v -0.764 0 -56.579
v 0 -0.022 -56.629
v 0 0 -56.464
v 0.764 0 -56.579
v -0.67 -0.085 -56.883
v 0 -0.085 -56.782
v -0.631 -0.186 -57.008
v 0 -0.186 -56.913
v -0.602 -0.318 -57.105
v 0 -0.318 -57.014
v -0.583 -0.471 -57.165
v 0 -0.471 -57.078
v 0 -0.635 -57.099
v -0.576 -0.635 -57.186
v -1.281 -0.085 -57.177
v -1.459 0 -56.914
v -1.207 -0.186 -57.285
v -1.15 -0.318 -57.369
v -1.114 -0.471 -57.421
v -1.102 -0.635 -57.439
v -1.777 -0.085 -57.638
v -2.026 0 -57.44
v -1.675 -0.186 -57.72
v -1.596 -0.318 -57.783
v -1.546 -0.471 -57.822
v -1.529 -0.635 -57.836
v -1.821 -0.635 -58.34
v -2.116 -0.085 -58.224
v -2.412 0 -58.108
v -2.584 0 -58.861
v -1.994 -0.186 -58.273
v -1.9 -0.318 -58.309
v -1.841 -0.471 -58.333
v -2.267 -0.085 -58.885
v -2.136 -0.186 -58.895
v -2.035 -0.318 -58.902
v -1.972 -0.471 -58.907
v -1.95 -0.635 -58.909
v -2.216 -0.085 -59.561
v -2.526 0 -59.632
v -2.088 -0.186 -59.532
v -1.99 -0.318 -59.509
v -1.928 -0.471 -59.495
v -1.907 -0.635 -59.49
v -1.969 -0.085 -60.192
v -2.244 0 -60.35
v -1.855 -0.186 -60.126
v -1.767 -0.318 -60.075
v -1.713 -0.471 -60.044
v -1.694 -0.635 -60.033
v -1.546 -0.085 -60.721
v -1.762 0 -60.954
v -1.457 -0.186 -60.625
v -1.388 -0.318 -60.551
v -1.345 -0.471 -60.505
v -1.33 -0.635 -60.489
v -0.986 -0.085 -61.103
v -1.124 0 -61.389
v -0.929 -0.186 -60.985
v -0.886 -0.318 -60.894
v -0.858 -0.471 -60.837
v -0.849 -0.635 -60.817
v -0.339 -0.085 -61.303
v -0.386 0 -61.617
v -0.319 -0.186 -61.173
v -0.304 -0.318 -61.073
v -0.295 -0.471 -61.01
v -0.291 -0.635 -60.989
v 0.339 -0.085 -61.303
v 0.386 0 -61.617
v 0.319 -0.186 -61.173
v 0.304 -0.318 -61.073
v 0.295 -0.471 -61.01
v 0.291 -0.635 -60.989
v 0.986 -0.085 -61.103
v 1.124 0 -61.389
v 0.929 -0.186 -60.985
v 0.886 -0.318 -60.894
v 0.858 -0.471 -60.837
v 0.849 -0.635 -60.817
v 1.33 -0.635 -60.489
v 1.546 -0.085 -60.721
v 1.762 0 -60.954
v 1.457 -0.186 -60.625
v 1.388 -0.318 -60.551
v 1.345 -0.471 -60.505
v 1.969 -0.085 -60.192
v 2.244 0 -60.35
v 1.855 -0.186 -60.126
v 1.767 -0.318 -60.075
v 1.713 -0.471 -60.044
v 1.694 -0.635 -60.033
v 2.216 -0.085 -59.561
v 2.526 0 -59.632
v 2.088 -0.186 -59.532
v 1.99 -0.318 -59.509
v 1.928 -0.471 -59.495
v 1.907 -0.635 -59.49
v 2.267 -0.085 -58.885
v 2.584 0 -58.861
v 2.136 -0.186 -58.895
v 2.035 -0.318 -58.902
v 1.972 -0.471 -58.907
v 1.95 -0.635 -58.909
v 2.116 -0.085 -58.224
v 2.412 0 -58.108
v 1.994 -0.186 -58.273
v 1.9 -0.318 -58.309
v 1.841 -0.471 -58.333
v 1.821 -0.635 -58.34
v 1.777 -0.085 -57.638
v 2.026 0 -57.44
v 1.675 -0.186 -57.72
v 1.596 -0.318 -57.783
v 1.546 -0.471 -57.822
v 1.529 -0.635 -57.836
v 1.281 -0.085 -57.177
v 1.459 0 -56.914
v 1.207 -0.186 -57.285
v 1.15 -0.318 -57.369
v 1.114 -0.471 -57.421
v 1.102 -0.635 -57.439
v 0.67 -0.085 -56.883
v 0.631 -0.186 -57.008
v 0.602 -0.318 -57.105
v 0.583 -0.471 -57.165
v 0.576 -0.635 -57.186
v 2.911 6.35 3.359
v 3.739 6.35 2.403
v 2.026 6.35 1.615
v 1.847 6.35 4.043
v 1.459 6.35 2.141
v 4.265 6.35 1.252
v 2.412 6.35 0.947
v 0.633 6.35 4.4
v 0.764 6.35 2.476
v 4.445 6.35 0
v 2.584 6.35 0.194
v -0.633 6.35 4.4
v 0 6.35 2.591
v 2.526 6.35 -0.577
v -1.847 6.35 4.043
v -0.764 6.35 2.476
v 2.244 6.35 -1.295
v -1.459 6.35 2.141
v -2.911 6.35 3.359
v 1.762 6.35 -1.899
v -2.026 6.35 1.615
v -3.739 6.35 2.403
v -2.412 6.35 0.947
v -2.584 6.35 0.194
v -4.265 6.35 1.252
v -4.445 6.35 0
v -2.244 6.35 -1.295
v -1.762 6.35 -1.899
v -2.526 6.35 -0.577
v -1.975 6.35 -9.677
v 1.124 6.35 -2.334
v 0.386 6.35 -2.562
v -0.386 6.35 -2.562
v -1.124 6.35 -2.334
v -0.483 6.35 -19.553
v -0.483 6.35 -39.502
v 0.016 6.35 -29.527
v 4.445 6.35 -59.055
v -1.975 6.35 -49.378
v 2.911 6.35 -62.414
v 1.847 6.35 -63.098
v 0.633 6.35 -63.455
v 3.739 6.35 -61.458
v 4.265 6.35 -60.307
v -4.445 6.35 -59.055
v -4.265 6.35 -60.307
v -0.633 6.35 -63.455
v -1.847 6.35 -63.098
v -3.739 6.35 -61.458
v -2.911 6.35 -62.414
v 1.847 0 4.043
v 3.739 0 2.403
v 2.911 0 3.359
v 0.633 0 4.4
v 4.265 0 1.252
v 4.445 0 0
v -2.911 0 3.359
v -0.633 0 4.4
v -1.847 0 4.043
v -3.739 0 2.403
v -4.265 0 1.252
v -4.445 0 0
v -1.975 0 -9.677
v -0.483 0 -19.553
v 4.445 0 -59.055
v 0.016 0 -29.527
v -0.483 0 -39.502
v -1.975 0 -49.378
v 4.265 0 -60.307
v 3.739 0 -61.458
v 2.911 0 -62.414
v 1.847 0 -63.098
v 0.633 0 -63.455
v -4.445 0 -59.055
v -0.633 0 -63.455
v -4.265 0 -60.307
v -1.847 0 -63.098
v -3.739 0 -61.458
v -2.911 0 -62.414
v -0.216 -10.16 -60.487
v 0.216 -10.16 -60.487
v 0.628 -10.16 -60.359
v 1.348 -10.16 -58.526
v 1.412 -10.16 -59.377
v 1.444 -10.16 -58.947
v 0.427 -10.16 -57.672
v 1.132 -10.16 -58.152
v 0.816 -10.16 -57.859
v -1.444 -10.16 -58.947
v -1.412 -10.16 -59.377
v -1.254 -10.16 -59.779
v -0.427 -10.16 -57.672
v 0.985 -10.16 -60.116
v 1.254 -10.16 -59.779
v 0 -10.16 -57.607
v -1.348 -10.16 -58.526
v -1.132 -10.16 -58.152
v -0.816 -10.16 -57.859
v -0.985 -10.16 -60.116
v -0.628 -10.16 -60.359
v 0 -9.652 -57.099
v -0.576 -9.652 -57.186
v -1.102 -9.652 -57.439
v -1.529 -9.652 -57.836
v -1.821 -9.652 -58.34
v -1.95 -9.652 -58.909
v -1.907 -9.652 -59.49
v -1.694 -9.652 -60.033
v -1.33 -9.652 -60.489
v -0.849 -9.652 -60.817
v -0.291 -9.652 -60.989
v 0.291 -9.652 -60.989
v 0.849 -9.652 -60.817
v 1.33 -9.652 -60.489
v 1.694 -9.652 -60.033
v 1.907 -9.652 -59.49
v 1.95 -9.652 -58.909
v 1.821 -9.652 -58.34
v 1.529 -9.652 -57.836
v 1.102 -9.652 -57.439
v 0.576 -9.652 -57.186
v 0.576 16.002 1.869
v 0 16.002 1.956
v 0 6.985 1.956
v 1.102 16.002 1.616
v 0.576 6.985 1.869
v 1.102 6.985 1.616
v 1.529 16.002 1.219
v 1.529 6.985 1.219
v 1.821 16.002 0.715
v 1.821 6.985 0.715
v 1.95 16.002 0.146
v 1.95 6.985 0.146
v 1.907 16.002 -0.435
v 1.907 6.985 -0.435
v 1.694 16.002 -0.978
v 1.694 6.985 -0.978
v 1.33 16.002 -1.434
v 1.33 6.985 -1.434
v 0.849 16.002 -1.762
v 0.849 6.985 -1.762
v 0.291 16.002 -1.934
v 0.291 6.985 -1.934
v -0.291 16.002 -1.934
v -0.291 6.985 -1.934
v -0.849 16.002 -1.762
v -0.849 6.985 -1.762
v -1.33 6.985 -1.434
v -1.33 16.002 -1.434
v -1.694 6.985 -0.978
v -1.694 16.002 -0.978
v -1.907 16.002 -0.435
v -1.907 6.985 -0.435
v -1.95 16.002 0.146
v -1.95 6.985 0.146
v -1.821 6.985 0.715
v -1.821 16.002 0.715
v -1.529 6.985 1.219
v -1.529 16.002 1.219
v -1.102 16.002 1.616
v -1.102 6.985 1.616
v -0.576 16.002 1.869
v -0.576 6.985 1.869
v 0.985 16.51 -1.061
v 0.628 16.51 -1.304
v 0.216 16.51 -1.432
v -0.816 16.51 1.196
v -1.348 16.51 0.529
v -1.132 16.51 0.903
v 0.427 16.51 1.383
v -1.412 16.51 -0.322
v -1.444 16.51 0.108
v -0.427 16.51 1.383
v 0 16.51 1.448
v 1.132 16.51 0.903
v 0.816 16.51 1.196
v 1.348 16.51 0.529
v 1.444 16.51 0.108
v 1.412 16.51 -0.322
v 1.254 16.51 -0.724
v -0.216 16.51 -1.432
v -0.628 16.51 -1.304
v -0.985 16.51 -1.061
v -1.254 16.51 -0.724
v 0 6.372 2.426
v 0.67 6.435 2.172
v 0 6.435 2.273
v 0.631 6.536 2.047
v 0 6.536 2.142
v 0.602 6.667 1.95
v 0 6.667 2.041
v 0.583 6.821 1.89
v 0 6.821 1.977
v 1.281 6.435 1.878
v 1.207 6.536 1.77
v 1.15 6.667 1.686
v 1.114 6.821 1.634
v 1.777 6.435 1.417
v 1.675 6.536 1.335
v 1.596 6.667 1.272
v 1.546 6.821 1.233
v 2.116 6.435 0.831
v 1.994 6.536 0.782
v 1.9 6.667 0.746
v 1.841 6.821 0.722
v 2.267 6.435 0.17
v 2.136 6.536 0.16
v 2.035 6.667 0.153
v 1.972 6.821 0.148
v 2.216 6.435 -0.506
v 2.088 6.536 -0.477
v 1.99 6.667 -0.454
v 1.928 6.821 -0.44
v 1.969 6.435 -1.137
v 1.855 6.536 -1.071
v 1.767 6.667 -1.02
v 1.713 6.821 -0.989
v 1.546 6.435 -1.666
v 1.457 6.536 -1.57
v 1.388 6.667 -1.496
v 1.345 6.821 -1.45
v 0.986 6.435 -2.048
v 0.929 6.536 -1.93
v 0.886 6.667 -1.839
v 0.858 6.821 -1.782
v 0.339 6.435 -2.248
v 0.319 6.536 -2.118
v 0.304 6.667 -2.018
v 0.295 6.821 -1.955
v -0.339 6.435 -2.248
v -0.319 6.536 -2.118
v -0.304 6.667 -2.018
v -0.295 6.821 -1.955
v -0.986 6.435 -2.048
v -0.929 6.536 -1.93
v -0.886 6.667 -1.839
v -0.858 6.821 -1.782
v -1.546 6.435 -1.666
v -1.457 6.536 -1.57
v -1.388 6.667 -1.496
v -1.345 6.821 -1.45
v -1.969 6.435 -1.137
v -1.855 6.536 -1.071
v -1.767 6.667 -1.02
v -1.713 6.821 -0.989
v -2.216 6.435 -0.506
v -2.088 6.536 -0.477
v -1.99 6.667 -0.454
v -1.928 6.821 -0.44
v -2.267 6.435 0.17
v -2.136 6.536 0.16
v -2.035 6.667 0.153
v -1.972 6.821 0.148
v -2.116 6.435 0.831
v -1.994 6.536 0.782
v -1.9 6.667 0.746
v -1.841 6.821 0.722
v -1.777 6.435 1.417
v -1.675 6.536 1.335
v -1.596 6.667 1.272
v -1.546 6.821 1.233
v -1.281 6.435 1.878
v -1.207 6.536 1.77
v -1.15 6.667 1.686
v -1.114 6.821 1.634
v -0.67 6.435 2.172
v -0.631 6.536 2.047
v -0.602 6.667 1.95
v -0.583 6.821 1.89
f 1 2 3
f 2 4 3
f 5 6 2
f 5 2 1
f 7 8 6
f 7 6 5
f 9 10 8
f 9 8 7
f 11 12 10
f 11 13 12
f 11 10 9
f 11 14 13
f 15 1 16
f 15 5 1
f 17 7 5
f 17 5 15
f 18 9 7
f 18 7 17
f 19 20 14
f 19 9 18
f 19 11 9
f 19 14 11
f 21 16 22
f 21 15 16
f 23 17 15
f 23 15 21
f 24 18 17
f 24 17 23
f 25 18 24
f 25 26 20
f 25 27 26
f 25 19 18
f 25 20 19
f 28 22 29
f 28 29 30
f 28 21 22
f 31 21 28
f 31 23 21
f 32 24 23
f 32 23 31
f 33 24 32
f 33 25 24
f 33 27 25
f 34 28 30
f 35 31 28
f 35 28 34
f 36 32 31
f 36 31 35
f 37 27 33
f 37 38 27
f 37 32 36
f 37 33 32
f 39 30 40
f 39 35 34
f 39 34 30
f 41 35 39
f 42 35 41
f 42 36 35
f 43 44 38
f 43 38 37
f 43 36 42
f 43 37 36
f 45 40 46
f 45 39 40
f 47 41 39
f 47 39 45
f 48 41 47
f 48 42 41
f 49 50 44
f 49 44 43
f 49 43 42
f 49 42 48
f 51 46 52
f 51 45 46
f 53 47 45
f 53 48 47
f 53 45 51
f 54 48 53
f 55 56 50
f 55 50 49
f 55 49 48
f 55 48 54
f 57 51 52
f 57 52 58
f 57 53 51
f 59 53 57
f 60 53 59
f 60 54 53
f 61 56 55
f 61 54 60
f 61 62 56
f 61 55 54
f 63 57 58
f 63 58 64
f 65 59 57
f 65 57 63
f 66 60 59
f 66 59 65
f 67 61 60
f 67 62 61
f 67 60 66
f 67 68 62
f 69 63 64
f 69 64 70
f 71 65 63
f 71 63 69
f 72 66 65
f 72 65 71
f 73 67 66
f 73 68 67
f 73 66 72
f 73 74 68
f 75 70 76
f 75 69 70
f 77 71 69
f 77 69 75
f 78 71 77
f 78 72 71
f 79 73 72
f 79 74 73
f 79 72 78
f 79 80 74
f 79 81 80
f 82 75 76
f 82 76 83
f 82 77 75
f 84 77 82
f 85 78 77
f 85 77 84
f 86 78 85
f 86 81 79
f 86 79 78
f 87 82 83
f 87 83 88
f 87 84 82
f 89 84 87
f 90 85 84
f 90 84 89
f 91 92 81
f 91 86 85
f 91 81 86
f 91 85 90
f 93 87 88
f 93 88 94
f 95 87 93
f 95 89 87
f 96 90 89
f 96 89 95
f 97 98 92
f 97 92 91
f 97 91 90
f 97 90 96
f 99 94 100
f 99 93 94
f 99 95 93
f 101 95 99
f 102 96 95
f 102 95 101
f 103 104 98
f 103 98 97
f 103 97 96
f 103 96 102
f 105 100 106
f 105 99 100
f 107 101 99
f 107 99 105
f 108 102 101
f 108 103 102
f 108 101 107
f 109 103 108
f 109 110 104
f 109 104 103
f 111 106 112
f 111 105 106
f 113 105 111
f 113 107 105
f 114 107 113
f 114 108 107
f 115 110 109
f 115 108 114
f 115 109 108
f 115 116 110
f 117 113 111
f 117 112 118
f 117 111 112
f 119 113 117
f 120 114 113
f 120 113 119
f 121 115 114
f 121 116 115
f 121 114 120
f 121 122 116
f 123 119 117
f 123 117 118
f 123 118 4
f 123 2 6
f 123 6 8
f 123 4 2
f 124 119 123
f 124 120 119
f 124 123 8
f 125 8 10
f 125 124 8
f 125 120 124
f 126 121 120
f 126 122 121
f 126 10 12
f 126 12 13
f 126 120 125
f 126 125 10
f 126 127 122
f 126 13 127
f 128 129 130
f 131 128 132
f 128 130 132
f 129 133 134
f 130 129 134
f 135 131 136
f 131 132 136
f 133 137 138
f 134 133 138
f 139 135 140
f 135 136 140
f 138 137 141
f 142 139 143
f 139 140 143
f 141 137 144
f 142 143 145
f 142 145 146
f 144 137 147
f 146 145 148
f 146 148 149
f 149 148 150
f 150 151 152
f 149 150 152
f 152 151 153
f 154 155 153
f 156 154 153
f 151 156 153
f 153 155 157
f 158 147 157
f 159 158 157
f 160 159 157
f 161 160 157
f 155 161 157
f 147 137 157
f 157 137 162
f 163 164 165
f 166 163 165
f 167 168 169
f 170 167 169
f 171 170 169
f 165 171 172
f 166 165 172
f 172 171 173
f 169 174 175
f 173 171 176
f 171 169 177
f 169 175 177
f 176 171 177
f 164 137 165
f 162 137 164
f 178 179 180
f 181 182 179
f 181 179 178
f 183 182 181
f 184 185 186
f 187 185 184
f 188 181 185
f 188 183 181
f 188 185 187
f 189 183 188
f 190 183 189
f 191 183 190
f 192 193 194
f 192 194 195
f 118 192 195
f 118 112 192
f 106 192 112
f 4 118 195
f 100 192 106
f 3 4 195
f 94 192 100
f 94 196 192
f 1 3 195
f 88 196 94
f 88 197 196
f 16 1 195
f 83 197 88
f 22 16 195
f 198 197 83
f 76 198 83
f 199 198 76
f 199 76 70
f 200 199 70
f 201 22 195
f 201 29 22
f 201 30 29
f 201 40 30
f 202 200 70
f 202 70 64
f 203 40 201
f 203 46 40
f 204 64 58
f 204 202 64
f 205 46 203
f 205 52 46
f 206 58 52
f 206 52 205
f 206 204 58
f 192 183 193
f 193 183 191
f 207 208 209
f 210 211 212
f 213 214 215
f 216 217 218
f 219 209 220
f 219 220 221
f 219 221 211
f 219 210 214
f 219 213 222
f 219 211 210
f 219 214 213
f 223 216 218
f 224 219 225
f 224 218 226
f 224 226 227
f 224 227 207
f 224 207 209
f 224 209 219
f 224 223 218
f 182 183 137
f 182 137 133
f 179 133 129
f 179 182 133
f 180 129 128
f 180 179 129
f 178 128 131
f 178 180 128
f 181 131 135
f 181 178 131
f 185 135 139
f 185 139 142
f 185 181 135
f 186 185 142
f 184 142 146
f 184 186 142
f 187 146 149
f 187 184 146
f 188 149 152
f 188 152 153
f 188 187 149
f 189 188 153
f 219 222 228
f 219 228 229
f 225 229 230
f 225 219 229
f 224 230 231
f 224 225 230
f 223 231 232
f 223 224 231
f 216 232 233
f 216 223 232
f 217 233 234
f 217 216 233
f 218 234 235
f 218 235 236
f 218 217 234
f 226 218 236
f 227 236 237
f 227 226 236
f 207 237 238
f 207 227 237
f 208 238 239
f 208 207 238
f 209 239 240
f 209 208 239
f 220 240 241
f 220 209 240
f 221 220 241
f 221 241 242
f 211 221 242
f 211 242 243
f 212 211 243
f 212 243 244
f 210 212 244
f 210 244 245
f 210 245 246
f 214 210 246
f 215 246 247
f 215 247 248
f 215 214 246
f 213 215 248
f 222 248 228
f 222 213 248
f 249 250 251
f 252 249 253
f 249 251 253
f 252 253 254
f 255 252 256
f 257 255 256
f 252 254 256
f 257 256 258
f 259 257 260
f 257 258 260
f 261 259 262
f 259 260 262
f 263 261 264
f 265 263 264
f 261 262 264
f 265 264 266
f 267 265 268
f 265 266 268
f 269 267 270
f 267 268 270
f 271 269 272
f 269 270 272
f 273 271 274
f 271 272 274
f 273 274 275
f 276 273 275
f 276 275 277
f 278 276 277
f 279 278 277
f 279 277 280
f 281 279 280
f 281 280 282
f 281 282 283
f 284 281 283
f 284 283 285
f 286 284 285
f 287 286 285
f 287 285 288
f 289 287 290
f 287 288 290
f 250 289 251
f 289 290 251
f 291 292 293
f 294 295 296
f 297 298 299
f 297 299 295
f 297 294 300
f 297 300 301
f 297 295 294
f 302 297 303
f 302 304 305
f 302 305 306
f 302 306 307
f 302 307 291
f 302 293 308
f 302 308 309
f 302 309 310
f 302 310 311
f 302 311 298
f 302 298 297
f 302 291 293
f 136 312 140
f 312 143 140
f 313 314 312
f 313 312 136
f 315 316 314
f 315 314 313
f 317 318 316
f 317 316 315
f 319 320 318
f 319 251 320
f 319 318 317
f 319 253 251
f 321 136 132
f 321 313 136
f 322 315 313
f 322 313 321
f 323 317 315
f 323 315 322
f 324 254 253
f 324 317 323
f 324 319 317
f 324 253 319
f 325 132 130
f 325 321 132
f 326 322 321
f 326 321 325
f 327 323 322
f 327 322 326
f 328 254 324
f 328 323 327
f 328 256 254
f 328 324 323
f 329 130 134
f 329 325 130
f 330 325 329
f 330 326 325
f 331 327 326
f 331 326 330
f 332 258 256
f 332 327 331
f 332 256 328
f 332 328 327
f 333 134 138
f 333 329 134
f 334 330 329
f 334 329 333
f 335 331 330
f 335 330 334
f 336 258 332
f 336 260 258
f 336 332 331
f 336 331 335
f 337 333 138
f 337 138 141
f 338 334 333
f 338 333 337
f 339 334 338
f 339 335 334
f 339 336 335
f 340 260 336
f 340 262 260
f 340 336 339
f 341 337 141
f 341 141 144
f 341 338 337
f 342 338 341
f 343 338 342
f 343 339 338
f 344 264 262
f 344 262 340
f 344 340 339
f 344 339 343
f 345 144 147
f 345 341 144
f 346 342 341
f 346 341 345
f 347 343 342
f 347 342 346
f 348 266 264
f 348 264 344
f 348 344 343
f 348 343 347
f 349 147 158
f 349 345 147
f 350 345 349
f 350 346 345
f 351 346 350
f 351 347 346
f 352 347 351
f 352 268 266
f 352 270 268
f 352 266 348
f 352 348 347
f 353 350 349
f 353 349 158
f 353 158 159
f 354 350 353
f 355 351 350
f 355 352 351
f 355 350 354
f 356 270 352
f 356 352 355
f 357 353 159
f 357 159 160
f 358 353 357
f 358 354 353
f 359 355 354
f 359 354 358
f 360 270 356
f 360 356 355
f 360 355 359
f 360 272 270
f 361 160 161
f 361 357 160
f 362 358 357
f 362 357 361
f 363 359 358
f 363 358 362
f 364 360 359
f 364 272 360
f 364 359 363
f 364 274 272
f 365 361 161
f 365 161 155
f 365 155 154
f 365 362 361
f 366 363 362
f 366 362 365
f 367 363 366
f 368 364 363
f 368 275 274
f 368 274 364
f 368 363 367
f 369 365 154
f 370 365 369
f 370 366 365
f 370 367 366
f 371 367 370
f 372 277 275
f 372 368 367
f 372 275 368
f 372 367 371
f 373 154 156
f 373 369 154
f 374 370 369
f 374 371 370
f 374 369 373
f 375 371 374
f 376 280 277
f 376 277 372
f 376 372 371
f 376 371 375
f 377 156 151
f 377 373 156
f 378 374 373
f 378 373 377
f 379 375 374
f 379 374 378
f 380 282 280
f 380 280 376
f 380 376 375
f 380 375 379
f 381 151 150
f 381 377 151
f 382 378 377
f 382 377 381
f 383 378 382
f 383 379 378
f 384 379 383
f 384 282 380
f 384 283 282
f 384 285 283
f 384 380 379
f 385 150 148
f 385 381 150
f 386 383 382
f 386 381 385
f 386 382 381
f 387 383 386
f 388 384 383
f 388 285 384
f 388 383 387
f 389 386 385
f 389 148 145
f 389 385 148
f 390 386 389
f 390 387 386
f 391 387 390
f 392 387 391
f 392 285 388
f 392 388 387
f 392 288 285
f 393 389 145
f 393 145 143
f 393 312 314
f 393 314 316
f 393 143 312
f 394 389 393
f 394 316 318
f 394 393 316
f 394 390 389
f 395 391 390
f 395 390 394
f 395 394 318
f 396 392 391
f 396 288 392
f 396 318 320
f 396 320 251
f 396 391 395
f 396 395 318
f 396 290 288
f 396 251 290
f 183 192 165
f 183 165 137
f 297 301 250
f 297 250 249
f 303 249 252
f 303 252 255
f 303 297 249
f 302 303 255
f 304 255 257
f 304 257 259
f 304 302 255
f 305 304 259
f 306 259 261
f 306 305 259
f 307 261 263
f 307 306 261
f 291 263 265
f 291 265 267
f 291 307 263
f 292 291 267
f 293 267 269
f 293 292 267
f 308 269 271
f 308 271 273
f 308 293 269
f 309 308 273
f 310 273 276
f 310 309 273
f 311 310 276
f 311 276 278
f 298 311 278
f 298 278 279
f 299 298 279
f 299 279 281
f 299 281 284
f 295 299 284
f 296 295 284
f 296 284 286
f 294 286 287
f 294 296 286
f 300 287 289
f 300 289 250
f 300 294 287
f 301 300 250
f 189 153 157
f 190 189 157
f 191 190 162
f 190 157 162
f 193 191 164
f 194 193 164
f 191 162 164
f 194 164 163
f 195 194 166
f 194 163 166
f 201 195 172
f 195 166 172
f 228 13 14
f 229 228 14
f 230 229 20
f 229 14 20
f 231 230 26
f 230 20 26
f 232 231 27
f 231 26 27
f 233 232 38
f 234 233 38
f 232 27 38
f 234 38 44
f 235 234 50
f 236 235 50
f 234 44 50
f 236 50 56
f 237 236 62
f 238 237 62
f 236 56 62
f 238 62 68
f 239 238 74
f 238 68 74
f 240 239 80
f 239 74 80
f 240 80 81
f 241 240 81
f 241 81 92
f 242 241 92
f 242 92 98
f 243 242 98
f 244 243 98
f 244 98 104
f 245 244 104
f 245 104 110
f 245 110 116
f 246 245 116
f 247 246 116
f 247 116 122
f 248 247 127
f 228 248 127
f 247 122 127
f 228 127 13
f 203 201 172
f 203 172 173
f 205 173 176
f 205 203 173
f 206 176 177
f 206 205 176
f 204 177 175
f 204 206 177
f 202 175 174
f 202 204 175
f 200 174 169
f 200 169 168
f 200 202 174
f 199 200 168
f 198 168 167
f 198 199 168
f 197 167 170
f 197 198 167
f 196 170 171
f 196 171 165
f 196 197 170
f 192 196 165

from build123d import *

# Parameters (mm, degrees)
BOSS_EXTRUDE1_DEPTH = 6.35
SKETCH3_R           = 1.9558
BOSS_EXTRUDE3_DEPTH = 10.16
SKETCH4_R           = 1.9558
BOSS_EXTRUDE4_DEPTH = 10.16
CUT_EXTRUDE1_DEPTH  = 66.761600688
FILLET2_R           = 0.635
CHAMFER4_SIZE       = 0.508


with BuildPart() as part:
    # Sketch1 → Boss-Extrude1 (new body)
    with BuildSketch(Plane(origin=(0, 0, 0), x_dir=(1, 0, 0), z_dir=(0, 1, 0))):
        with BuildLine():
            Line((-4.445, 0), (-4.445, 59.055))
            ThreePointArc((-4.445, 59.055), (0, 63.5), (4.445, 59.055))
            Line((4.445, 59.055), (4.445, 0))
            ThreePointArc((4.445, 0), (0, -4.445), (-4.445, 0))
        make_face()
    extrude(amount=BOSS_EXTRUDE1_DEPTH)

    # Sketch3 → Boss-Extrude3 (add)
    with BuildSketch(Plane(origin=(0, 6.35, 0), x_dir=(1, 0, 0), z_dir=(0, 1, 0))):
        with Locations(Location((0, 0, 0), (0, 0, 270))):
            Circle(SKETCH3_R)
    extrude(amount=BOSS_EXTRUDE3_DEPTH)

    # Sketch4 → Boss-Extrude4 (add)
    with BuildSketch(Plane.XZ):
        with Locations(Location((0, -59.055, 0), (0, 0, 90))):
            Circle(SKETCH4_R)
    extrude(amount=BOSS_EXTRUDE4_DEPTH)

    # Sketch5 → Cut-Extrude1 (cut, through all)
    with BuildSketch(Plane(origin=(0, 6.35, 0), x_dir=(1, 0, 0), z_dir=(0, 1, 0))):
        with BuildLine():
            Line((-4.445, 59.055), (-4.445, 0))
            ThreePointArc((-4.445, 0), (0.015635542, 29.5275), (-4.445, 59.055))
        make_face()
    extrude(amount=-CUT_EXTRUDE1_DEPTH, mode=Mode.SUBTRACT)

    # Fillet2
    fillet2_edges = [part.edges().sort_by_distance(p)[0] for p in [
        (0, 6.35, -1.9558),
        (0, 0, -61.0108),
    ]]
    fillet(fillet2_edges, radius=FILLET2_R)

    # Chamfer4
    chamfer4_edges = [part.edges().sort_by_distance(p)[0] for p in [
        (0, 16.51, -1.9558),
        (0, -10.16, -61.0108),
    ]]
    chamfer(chamfer4_edges, length=CHAMFER4_SIZE)


solid = part.part
